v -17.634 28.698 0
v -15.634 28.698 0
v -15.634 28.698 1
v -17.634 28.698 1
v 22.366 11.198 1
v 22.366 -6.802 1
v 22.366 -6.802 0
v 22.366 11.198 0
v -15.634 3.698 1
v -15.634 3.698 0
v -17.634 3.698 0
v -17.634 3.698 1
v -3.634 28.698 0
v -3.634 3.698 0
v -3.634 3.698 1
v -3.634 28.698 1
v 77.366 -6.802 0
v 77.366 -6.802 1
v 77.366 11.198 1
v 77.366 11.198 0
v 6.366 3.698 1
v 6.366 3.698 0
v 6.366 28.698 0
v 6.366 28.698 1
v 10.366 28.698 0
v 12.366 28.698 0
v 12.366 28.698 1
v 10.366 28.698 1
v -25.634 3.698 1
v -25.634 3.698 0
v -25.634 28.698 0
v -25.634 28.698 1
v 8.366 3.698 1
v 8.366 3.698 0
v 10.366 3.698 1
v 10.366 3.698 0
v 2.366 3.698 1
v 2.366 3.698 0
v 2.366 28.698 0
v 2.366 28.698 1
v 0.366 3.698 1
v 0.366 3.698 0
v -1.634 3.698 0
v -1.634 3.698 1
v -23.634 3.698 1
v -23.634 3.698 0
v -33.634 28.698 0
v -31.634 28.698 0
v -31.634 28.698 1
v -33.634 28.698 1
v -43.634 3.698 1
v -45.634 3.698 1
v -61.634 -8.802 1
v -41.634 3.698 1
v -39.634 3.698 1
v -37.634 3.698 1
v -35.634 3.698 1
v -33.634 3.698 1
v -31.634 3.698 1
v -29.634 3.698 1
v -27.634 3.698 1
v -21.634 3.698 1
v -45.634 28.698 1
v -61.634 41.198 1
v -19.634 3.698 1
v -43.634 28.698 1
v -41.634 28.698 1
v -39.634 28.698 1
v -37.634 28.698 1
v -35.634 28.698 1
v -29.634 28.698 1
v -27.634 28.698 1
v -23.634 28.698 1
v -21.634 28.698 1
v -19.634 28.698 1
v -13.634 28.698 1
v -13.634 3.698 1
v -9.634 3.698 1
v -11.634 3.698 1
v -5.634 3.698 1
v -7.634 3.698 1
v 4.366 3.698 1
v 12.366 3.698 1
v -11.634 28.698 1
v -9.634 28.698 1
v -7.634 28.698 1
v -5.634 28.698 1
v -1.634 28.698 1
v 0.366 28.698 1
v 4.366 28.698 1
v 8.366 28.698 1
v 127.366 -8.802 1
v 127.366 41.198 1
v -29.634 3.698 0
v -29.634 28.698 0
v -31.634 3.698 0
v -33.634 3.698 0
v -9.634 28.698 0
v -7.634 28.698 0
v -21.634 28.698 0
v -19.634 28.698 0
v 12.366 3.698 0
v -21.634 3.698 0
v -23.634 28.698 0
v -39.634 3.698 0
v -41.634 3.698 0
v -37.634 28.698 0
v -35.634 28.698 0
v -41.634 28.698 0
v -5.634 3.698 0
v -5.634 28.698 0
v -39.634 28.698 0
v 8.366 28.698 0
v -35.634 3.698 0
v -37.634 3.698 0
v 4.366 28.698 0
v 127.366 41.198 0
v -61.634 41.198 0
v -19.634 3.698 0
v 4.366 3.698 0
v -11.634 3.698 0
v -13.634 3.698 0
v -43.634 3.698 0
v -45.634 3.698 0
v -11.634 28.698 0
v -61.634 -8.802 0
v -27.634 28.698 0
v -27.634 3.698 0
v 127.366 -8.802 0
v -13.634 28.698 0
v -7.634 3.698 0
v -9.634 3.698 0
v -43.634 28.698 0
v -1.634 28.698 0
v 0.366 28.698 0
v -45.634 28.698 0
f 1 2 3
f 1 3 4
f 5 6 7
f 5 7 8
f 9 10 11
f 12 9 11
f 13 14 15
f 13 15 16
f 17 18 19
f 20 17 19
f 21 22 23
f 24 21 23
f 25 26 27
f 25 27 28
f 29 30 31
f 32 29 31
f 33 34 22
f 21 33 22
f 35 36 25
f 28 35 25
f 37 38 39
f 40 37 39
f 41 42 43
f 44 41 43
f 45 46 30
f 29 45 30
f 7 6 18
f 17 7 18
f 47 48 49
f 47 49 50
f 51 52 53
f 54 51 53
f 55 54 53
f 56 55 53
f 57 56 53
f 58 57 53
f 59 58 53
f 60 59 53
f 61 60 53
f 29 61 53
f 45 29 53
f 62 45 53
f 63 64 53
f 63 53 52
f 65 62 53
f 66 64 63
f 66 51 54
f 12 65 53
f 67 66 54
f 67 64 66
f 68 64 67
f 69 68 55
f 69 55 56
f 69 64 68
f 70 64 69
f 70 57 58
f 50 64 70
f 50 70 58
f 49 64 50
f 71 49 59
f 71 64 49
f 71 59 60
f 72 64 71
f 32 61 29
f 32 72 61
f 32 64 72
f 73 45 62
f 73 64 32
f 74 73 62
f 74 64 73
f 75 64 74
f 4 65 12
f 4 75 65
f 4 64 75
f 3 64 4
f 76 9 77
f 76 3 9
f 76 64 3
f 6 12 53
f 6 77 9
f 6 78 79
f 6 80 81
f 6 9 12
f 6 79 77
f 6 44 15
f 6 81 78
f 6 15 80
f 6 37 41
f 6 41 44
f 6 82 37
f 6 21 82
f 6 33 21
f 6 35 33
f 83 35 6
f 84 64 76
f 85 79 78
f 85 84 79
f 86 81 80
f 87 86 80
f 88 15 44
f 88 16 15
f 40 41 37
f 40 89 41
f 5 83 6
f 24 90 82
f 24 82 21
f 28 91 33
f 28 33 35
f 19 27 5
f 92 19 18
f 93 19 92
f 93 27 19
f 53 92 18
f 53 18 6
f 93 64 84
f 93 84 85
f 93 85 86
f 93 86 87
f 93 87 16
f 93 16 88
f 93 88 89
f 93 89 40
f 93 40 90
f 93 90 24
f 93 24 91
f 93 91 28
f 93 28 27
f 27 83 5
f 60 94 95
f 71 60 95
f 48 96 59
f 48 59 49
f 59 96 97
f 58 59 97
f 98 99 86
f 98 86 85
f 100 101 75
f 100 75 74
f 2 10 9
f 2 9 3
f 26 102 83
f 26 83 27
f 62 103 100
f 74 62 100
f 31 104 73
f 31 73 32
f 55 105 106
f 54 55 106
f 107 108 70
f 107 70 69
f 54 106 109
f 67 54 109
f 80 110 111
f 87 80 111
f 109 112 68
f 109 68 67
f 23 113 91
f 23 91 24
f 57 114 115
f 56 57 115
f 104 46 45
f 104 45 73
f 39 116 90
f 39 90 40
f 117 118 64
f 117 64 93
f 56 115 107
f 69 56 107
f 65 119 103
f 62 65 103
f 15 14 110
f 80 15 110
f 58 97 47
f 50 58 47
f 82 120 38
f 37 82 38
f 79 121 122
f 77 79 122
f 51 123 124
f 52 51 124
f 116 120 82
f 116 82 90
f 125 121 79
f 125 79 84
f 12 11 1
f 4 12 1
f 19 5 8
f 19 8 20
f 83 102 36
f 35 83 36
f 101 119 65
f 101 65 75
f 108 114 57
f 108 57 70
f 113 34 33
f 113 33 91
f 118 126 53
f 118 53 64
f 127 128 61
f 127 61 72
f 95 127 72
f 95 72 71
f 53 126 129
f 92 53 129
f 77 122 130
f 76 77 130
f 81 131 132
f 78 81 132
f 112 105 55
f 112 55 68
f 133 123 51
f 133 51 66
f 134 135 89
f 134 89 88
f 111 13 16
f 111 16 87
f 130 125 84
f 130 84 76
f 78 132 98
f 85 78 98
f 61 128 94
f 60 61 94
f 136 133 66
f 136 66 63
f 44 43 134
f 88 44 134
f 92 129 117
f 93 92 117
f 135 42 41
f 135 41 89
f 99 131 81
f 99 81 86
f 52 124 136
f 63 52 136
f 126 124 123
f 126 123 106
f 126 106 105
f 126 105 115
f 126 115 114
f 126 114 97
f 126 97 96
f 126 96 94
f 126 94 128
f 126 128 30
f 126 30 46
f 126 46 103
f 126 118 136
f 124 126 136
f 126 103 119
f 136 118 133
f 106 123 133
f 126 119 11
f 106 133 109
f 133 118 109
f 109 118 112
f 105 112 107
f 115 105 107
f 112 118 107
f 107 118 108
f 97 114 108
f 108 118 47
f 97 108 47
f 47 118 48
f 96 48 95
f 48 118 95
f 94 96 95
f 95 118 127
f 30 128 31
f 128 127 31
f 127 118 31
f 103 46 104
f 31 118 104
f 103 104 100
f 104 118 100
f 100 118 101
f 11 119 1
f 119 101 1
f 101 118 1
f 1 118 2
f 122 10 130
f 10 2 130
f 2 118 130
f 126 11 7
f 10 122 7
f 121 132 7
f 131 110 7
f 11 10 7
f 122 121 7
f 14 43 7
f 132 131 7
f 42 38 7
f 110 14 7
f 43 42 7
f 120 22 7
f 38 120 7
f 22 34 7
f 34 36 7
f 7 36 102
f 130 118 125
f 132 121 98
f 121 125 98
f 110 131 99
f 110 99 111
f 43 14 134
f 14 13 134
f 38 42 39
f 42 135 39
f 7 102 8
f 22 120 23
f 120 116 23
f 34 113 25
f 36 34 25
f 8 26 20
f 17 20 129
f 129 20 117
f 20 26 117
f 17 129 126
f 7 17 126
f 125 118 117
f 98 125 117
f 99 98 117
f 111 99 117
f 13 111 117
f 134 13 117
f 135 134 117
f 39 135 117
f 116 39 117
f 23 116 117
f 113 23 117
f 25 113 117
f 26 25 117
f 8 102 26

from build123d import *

# Parameters (mm, degrees)
SKETCH1_W           = 189
SKETCH1_H           = 50
BOSS_EXTRUDE1_DEPTH = 1
SKETCH2_W           = 55
SKETCH2_H           = 18
CUT_EXTRUDE1_DEPTH  = 2
SKETCH3_W           = 2
SKETCH3_H           = 25
CUT_EXTRUDE2_DEPTH  = 2


with BuildPart() as part:
    # Sketch1 → Boss-Extrude1 (new body)
    with BuildSketch(Plane.XY):
        with Locations((32.8655586, 16.198012015)):
            Rectangle(SKETCH1_W, SKETCH1_H)
    extrude(amount=BOSS_EXTRUDE1_DEPTH)

    # Sketch2 → Cut-Extrude1 (cut, through all)
    with BuildSketch(Plane.XY.offset(1)):
        with Locations((49.8655586, 2.198012015)):
            Rectangle(SKETCH2_W, SKETCH2_H)
    extrude(amount=-CUT_EXTRUDE1_DEPTH, mode=Mode.SUBTRACT)

    # Sketch3 → Cut-Extrude2 (cut, through all)
    with BuildSketch(Plane(origin=(0, 0, 0), x_dir=(-1, 0, 0), z_dir=(0, 0, -1))):
        with Locations((-11.3655586, 16.198012015)):
            Rectangle(SKETCH3_W, SKETCH3_H)
        with Locations((-7.3655586, 16.198012015)):
            Rectangle(SKETCH3_W, SKETCH3_H)
        with Locations((-3.3655586, 16.198012015)):
            Rectangle(SKETCH3_W, SKETCH3_H)
        with Locations((0.6344414, 16.198012015)):
            Rectangle(SKETCH3_W, SKETCH3_H)
        with Locations((4.6344414, 16.198012015)):
            Rectangle(SKETCH3_W, SKETCH3_H)
        with Locations((8.6344414, 16.198012015)):
            Rectangle(SKETCH3_W, SKETCH3_H)
        with Locations((12.6344414, 16.198012015)):
            Rectangle(SKETCH3_W, SKETCH3_H)
        with Locations((16.6344414, 16.198012015)):
            Rectangle(SKETCH3_W, SKETCH3_H)
        with Locations((20.6344414, 16.198012015)):
            Rectangle(SKETCH3_W, SKETCH3_H)
        with Locations((24.6344414, 16.198012015)):
            Rectangle(SKETCH3_W, SKETCH3_H)
        with Locations((28.6344414, 16.198012015)):
            Rectangle(SKETCH3_W, SKETCH3_H)
        with Locations((32.6344414, 16.198012015)):
            Rectangle(SKETCH3_W, SKETCH3_H)
        with Locations((36.6344414, 16.198012015)):
            Rectangle(SKETCH3_W, SKETCH3_H)
        with Locations((40.6344414, 16.198012015)):
            Rectangle(SKETCH3_W, SKETCH3_H)
        with Locations((44.6344414, 16.198012015)):
            Rectangle(SKETCH3_W, SKETCH3_H)
    extrude(amount=-CUT_EXTRUDE2_DEPTH, mode=Mode.SUBTRACT)


solid = part.part
